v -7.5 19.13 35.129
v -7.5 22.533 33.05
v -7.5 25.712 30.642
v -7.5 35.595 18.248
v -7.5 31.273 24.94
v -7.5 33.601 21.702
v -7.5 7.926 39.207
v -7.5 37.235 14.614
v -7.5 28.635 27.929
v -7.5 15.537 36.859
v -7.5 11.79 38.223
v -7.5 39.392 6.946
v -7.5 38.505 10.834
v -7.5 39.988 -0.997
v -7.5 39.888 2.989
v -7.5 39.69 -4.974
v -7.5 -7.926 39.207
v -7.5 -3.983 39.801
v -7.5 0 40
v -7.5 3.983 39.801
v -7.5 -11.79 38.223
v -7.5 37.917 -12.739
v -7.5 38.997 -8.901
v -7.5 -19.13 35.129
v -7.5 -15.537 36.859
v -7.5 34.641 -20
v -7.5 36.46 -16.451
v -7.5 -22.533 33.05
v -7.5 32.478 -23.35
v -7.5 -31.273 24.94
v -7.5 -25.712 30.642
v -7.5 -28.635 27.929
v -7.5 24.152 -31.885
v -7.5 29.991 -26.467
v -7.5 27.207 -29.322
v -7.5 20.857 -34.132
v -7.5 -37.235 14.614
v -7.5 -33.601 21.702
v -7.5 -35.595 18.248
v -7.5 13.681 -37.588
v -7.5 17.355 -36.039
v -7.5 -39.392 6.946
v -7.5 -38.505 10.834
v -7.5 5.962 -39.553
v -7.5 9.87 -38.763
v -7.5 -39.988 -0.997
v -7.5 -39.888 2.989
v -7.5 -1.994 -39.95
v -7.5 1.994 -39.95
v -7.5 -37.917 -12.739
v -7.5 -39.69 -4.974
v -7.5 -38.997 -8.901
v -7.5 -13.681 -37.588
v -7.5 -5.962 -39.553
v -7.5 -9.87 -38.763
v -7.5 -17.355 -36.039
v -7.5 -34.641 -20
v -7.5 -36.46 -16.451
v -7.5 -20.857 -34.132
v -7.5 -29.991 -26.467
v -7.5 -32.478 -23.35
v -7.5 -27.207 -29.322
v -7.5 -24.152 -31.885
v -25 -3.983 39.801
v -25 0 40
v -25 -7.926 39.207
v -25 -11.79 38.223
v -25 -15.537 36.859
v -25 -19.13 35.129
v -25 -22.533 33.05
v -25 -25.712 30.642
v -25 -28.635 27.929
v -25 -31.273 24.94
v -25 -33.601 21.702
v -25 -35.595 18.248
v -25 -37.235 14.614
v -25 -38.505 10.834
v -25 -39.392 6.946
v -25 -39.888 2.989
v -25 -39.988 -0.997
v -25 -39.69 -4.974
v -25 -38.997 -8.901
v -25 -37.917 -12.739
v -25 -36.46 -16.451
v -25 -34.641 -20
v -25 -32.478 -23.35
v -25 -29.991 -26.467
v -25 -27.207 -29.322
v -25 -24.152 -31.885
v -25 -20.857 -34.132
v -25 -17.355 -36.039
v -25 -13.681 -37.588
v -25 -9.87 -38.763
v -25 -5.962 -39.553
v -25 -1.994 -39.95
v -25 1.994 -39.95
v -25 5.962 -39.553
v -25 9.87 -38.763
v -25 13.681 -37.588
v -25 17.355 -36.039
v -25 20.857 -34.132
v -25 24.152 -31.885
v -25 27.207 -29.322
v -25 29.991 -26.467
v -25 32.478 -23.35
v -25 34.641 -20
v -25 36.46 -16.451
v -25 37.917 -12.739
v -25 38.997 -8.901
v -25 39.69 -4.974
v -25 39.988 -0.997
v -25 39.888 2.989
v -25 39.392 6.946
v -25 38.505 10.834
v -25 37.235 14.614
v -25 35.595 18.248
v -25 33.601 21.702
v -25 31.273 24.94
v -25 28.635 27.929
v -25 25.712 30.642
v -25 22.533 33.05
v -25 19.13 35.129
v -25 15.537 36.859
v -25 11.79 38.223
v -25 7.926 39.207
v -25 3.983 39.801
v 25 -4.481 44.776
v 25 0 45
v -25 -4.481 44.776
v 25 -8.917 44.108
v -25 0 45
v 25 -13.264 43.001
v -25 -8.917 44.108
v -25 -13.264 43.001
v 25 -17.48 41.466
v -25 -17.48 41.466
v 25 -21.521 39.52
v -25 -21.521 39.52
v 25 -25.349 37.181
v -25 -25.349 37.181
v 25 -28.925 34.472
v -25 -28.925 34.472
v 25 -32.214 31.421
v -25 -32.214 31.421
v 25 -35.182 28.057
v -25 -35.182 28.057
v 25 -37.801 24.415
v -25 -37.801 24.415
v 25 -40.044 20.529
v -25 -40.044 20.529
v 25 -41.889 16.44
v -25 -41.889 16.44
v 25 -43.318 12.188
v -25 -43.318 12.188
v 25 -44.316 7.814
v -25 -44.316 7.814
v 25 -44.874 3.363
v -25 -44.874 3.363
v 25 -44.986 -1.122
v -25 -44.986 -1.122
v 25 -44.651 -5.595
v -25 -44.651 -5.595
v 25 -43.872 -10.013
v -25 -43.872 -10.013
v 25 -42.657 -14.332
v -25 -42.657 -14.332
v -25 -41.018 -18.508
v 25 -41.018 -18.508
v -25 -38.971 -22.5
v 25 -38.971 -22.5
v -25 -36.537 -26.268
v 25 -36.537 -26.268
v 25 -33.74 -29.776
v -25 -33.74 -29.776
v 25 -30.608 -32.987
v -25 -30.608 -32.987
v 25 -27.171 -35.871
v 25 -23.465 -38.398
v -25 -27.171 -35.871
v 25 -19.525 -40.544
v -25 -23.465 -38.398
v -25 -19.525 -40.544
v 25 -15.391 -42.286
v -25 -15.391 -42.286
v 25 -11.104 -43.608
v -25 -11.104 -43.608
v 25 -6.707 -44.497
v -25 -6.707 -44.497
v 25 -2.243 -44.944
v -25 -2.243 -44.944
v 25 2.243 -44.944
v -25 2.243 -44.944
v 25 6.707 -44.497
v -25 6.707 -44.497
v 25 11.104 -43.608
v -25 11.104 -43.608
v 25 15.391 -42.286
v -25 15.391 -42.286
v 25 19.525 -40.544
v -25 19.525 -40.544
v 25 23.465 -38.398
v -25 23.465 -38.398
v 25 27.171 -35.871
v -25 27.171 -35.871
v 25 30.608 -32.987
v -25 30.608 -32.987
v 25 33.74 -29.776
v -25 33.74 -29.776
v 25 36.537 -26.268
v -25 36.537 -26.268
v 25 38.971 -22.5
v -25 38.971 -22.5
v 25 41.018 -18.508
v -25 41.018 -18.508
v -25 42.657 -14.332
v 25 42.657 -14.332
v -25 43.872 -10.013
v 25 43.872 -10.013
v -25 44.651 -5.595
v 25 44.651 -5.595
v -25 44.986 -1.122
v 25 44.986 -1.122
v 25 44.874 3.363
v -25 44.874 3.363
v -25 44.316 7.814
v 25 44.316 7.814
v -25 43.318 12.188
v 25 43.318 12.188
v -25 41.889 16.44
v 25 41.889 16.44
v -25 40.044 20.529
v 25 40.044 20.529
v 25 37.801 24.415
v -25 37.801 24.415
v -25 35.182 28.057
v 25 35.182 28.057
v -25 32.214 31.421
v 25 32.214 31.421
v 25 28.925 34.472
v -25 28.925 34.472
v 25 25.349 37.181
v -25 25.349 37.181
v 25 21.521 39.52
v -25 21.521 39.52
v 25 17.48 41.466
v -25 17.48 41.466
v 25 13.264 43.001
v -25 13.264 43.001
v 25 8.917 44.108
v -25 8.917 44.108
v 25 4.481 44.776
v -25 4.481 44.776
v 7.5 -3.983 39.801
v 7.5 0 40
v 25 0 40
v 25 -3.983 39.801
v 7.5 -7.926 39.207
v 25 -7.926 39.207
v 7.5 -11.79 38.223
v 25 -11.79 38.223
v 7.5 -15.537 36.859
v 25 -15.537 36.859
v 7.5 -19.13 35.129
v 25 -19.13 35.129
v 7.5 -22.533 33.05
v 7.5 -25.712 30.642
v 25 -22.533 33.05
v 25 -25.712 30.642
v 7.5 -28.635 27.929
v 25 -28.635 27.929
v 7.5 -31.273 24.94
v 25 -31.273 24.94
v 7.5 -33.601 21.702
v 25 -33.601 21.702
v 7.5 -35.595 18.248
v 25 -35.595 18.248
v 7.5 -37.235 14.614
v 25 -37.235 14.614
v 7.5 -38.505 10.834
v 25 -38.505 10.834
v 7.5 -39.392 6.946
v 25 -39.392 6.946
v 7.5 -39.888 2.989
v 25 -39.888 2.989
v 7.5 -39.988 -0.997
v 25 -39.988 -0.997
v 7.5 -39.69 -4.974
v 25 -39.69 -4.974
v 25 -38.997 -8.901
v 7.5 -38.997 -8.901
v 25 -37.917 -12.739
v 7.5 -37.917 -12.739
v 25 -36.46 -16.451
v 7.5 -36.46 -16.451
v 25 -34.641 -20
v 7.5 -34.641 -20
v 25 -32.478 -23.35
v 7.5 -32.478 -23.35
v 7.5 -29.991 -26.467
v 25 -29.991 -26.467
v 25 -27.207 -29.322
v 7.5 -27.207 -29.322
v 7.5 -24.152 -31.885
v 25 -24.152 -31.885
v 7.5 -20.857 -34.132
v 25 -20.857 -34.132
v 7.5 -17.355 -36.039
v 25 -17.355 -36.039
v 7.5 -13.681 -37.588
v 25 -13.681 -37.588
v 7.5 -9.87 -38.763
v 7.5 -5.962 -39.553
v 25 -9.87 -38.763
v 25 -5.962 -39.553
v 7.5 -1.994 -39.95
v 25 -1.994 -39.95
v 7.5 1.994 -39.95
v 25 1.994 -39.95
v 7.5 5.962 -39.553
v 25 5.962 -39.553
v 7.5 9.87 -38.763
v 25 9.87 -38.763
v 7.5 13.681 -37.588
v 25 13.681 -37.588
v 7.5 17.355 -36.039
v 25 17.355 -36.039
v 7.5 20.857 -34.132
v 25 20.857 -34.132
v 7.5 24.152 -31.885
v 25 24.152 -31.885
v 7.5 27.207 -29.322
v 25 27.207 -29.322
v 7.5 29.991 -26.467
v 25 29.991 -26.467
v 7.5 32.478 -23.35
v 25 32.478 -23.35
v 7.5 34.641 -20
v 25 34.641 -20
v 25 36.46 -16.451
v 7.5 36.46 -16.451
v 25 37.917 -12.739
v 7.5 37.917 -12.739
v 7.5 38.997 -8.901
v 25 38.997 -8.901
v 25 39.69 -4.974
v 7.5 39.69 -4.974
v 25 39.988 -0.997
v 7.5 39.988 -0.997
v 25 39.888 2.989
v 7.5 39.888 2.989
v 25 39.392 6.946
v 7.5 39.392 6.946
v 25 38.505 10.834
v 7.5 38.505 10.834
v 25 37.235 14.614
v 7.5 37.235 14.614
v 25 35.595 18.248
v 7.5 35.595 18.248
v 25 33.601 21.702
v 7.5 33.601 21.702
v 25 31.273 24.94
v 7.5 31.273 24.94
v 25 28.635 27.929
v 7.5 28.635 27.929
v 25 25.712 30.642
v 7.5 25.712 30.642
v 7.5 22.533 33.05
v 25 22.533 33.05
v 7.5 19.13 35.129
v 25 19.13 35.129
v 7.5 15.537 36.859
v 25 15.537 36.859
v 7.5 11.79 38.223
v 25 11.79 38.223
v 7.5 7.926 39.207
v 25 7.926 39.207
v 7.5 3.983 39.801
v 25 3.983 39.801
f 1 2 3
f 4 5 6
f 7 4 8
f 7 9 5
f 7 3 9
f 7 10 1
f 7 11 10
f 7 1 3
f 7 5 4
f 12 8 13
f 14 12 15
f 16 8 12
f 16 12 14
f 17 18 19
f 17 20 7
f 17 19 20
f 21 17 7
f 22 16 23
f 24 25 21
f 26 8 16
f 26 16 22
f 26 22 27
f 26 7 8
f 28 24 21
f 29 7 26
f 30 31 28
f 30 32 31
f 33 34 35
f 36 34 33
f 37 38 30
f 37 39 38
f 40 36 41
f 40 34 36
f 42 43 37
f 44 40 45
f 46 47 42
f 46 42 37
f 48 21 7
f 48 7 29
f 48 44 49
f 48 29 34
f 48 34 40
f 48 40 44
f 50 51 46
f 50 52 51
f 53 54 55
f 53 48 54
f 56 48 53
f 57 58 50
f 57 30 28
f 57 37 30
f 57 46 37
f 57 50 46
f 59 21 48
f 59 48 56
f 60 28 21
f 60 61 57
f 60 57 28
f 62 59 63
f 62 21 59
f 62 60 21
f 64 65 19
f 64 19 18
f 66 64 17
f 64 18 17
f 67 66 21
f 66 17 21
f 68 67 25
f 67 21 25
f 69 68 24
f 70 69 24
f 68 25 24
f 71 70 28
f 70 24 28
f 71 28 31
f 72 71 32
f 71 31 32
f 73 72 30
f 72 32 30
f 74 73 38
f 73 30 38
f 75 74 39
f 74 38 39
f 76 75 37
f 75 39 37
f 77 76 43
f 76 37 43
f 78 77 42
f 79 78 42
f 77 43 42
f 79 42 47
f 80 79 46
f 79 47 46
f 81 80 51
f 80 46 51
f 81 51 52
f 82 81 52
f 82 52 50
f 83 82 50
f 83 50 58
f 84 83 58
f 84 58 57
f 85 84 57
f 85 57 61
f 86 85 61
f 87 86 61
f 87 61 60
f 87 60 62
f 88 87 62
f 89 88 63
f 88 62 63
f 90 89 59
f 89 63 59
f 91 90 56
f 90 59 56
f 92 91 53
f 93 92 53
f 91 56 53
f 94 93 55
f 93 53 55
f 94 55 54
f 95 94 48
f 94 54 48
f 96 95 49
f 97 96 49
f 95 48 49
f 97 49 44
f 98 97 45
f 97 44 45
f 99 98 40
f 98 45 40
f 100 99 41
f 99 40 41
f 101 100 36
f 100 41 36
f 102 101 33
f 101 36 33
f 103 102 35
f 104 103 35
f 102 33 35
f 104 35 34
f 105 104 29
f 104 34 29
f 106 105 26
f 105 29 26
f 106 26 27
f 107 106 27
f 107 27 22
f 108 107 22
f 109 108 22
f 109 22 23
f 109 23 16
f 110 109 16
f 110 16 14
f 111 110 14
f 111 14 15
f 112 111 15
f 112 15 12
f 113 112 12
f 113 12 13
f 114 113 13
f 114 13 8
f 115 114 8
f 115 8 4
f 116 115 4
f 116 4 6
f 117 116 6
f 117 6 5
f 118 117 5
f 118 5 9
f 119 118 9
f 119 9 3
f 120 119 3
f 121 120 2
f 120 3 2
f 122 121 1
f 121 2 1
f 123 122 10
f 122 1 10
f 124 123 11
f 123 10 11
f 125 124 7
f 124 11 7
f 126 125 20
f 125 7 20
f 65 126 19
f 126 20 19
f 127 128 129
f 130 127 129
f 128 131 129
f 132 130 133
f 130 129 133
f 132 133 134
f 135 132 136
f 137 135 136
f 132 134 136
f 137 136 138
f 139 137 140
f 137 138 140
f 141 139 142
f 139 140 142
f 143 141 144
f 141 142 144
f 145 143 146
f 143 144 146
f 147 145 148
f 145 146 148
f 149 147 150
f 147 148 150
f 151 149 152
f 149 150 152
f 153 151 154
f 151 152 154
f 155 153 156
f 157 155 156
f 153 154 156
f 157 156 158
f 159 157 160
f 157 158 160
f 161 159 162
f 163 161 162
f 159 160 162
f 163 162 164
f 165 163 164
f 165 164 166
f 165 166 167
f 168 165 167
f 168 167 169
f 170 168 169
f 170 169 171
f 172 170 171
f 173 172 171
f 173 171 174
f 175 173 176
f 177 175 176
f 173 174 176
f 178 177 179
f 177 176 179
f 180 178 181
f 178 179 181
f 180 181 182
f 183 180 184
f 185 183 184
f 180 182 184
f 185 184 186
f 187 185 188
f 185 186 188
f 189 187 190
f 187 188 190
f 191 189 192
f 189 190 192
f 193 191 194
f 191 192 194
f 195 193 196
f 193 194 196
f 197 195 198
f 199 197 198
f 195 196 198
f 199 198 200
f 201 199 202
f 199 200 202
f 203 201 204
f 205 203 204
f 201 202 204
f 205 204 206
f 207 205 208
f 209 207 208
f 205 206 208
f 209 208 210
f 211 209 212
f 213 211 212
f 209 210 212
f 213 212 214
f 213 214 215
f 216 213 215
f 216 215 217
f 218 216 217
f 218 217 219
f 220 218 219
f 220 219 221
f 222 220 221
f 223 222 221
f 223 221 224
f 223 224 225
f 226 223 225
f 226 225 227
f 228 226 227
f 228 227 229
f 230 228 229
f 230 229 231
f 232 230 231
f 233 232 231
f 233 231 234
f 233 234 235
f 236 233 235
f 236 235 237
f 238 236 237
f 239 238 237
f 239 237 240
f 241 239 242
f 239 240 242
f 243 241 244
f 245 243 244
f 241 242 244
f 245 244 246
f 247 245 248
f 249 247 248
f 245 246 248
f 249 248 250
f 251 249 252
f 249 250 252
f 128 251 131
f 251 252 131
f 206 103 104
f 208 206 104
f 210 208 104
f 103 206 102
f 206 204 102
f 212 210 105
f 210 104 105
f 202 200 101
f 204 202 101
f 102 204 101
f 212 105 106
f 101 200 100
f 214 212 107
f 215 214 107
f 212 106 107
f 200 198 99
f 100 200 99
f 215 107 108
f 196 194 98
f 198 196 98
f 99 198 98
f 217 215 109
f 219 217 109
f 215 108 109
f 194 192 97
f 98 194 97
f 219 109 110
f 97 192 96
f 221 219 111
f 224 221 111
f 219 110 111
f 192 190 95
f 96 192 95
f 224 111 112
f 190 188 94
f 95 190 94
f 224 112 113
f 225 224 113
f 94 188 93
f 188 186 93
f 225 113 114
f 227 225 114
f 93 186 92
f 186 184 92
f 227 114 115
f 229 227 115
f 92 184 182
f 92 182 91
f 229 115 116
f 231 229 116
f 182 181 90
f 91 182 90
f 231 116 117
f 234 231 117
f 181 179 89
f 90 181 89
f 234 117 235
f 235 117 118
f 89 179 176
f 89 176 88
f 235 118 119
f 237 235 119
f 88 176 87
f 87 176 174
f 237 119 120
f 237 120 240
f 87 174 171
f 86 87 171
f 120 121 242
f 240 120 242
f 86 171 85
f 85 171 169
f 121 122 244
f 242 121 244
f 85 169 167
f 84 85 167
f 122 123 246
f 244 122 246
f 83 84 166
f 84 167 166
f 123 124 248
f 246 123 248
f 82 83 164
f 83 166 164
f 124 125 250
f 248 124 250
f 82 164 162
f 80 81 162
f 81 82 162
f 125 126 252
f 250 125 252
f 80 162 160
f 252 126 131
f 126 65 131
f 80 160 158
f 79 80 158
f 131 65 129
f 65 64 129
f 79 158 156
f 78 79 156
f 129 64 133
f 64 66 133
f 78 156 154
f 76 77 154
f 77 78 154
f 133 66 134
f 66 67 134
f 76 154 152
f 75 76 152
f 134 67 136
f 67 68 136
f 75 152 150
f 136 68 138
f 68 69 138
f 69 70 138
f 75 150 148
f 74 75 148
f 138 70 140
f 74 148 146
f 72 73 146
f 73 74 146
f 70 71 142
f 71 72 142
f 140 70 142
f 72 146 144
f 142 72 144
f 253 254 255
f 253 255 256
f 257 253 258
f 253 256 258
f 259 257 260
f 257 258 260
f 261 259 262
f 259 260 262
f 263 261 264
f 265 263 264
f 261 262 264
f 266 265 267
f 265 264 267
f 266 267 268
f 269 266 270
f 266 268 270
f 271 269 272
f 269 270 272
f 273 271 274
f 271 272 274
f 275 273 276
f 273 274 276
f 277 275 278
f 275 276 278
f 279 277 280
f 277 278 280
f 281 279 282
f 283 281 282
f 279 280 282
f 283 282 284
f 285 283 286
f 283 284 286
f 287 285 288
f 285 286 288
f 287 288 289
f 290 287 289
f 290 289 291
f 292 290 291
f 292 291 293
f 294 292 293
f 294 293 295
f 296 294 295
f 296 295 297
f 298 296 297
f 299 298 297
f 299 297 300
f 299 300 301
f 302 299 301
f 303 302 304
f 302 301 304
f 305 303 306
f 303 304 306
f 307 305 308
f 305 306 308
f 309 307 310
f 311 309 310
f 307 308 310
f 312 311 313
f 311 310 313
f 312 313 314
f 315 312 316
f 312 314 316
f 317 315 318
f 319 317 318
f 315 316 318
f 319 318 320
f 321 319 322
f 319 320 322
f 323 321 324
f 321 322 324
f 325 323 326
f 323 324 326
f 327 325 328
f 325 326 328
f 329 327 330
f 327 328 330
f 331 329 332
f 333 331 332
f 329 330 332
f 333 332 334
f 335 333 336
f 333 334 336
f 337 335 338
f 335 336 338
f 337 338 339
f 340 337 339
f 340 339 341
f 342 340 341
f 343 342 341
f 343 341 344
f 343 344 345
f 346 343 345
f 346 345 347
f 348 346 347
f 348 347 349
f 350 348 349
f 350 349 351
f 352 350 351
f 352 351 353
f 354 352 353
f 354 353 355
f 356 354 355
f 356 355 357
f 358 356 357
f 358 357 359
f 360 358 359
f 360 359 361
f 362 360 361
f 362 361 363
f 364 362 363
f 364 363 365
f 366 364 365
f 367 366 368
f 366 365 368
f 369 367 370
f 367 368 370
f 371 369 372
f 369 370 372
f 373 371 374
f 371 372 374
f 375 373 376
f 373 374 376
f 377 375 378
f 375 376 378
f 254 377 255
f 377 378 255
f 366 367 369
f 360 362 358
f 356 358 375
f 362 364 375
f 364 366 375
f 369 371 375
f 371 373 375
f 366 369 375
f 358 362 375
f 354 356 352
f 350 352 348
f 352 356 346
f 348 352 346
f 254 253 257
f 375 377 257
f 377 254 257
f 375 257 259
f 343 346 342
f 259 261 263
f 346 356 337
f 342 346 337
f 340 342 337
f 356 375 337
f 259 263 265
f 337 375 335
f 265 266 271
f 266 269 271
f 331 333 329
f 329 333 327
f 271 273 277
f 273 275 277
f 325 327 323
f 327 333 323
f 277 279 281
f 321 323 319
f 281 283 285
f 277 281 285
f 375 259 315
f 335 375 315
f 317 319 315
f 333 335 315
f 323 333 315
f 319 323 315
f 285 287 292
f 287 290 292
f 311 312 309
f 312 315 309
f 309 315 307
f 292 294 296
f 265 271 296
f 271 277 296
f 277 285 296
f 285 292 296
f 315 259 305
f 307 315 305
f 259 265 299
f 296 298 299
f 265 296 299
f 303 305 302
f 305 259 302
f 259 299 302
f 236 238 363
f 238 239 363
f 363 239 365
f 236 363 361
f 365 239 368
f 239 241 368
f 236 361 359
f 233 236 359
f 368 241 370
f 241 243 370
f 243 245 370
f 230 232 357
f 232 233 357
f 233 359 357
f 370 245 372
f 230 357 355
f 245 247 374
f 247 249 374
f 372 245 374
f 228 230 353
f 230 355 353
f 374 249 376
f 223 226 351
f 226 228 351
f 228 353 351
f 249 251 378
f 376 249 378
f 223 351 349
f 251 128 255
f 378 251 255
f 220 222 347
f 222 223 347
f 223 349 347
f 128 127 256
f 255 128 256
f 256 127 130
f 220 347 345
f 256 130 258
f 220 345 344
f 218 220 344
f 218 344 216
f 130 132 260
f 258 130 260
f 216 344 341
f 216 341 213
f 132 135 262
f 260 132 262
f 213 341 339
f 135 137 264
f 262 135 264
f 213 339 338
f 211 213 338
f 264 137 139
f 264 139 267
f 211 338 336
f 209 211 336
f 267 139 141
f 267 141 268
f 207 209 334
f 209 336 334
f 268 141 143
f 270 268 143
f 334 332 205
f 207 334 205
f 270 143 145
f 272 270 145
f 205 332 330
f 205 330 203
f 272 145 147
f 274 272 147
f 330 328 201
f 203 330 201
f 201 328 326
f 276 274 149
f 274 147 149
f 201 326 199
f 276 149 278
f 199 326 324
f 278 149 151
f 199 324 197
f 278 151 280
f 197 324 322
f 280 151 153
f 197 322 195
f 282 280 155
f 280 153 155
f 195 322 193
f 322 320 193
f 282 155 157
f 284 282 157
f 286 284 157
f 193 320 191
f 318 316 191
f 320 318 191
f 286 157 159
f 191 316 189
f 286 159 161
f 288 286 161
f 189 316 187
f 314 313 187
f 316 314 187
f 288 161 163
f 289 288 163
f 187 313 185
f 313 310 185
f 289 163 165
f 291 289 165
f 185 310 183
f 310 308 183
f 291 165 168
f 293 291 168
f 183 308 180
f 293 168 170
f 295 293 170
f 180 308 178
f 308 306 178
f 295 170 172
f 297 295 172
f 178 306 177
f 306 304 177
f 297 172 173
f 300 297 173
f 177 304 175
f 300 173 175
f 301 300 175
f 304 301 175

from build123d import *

# Parameters (mm, degrees)
F0_W = 15
F0_H = 40


with BuildPart() as f1:
    # F0 (on Front) → F1 (revolve)
    with BuildSketch(Plane.XZ):
        with Locations((0, 20)):
            Rectangle(F0_W, F0_H)
        Polygon((-25, 40), (-7.5, 40), (7.5, 40), (25, 40), (25, 45), (-25, 45), align=None)
    revolve(axis=Axis((0, 0, 0), (1, 0, 0)))


solid = f1.part
